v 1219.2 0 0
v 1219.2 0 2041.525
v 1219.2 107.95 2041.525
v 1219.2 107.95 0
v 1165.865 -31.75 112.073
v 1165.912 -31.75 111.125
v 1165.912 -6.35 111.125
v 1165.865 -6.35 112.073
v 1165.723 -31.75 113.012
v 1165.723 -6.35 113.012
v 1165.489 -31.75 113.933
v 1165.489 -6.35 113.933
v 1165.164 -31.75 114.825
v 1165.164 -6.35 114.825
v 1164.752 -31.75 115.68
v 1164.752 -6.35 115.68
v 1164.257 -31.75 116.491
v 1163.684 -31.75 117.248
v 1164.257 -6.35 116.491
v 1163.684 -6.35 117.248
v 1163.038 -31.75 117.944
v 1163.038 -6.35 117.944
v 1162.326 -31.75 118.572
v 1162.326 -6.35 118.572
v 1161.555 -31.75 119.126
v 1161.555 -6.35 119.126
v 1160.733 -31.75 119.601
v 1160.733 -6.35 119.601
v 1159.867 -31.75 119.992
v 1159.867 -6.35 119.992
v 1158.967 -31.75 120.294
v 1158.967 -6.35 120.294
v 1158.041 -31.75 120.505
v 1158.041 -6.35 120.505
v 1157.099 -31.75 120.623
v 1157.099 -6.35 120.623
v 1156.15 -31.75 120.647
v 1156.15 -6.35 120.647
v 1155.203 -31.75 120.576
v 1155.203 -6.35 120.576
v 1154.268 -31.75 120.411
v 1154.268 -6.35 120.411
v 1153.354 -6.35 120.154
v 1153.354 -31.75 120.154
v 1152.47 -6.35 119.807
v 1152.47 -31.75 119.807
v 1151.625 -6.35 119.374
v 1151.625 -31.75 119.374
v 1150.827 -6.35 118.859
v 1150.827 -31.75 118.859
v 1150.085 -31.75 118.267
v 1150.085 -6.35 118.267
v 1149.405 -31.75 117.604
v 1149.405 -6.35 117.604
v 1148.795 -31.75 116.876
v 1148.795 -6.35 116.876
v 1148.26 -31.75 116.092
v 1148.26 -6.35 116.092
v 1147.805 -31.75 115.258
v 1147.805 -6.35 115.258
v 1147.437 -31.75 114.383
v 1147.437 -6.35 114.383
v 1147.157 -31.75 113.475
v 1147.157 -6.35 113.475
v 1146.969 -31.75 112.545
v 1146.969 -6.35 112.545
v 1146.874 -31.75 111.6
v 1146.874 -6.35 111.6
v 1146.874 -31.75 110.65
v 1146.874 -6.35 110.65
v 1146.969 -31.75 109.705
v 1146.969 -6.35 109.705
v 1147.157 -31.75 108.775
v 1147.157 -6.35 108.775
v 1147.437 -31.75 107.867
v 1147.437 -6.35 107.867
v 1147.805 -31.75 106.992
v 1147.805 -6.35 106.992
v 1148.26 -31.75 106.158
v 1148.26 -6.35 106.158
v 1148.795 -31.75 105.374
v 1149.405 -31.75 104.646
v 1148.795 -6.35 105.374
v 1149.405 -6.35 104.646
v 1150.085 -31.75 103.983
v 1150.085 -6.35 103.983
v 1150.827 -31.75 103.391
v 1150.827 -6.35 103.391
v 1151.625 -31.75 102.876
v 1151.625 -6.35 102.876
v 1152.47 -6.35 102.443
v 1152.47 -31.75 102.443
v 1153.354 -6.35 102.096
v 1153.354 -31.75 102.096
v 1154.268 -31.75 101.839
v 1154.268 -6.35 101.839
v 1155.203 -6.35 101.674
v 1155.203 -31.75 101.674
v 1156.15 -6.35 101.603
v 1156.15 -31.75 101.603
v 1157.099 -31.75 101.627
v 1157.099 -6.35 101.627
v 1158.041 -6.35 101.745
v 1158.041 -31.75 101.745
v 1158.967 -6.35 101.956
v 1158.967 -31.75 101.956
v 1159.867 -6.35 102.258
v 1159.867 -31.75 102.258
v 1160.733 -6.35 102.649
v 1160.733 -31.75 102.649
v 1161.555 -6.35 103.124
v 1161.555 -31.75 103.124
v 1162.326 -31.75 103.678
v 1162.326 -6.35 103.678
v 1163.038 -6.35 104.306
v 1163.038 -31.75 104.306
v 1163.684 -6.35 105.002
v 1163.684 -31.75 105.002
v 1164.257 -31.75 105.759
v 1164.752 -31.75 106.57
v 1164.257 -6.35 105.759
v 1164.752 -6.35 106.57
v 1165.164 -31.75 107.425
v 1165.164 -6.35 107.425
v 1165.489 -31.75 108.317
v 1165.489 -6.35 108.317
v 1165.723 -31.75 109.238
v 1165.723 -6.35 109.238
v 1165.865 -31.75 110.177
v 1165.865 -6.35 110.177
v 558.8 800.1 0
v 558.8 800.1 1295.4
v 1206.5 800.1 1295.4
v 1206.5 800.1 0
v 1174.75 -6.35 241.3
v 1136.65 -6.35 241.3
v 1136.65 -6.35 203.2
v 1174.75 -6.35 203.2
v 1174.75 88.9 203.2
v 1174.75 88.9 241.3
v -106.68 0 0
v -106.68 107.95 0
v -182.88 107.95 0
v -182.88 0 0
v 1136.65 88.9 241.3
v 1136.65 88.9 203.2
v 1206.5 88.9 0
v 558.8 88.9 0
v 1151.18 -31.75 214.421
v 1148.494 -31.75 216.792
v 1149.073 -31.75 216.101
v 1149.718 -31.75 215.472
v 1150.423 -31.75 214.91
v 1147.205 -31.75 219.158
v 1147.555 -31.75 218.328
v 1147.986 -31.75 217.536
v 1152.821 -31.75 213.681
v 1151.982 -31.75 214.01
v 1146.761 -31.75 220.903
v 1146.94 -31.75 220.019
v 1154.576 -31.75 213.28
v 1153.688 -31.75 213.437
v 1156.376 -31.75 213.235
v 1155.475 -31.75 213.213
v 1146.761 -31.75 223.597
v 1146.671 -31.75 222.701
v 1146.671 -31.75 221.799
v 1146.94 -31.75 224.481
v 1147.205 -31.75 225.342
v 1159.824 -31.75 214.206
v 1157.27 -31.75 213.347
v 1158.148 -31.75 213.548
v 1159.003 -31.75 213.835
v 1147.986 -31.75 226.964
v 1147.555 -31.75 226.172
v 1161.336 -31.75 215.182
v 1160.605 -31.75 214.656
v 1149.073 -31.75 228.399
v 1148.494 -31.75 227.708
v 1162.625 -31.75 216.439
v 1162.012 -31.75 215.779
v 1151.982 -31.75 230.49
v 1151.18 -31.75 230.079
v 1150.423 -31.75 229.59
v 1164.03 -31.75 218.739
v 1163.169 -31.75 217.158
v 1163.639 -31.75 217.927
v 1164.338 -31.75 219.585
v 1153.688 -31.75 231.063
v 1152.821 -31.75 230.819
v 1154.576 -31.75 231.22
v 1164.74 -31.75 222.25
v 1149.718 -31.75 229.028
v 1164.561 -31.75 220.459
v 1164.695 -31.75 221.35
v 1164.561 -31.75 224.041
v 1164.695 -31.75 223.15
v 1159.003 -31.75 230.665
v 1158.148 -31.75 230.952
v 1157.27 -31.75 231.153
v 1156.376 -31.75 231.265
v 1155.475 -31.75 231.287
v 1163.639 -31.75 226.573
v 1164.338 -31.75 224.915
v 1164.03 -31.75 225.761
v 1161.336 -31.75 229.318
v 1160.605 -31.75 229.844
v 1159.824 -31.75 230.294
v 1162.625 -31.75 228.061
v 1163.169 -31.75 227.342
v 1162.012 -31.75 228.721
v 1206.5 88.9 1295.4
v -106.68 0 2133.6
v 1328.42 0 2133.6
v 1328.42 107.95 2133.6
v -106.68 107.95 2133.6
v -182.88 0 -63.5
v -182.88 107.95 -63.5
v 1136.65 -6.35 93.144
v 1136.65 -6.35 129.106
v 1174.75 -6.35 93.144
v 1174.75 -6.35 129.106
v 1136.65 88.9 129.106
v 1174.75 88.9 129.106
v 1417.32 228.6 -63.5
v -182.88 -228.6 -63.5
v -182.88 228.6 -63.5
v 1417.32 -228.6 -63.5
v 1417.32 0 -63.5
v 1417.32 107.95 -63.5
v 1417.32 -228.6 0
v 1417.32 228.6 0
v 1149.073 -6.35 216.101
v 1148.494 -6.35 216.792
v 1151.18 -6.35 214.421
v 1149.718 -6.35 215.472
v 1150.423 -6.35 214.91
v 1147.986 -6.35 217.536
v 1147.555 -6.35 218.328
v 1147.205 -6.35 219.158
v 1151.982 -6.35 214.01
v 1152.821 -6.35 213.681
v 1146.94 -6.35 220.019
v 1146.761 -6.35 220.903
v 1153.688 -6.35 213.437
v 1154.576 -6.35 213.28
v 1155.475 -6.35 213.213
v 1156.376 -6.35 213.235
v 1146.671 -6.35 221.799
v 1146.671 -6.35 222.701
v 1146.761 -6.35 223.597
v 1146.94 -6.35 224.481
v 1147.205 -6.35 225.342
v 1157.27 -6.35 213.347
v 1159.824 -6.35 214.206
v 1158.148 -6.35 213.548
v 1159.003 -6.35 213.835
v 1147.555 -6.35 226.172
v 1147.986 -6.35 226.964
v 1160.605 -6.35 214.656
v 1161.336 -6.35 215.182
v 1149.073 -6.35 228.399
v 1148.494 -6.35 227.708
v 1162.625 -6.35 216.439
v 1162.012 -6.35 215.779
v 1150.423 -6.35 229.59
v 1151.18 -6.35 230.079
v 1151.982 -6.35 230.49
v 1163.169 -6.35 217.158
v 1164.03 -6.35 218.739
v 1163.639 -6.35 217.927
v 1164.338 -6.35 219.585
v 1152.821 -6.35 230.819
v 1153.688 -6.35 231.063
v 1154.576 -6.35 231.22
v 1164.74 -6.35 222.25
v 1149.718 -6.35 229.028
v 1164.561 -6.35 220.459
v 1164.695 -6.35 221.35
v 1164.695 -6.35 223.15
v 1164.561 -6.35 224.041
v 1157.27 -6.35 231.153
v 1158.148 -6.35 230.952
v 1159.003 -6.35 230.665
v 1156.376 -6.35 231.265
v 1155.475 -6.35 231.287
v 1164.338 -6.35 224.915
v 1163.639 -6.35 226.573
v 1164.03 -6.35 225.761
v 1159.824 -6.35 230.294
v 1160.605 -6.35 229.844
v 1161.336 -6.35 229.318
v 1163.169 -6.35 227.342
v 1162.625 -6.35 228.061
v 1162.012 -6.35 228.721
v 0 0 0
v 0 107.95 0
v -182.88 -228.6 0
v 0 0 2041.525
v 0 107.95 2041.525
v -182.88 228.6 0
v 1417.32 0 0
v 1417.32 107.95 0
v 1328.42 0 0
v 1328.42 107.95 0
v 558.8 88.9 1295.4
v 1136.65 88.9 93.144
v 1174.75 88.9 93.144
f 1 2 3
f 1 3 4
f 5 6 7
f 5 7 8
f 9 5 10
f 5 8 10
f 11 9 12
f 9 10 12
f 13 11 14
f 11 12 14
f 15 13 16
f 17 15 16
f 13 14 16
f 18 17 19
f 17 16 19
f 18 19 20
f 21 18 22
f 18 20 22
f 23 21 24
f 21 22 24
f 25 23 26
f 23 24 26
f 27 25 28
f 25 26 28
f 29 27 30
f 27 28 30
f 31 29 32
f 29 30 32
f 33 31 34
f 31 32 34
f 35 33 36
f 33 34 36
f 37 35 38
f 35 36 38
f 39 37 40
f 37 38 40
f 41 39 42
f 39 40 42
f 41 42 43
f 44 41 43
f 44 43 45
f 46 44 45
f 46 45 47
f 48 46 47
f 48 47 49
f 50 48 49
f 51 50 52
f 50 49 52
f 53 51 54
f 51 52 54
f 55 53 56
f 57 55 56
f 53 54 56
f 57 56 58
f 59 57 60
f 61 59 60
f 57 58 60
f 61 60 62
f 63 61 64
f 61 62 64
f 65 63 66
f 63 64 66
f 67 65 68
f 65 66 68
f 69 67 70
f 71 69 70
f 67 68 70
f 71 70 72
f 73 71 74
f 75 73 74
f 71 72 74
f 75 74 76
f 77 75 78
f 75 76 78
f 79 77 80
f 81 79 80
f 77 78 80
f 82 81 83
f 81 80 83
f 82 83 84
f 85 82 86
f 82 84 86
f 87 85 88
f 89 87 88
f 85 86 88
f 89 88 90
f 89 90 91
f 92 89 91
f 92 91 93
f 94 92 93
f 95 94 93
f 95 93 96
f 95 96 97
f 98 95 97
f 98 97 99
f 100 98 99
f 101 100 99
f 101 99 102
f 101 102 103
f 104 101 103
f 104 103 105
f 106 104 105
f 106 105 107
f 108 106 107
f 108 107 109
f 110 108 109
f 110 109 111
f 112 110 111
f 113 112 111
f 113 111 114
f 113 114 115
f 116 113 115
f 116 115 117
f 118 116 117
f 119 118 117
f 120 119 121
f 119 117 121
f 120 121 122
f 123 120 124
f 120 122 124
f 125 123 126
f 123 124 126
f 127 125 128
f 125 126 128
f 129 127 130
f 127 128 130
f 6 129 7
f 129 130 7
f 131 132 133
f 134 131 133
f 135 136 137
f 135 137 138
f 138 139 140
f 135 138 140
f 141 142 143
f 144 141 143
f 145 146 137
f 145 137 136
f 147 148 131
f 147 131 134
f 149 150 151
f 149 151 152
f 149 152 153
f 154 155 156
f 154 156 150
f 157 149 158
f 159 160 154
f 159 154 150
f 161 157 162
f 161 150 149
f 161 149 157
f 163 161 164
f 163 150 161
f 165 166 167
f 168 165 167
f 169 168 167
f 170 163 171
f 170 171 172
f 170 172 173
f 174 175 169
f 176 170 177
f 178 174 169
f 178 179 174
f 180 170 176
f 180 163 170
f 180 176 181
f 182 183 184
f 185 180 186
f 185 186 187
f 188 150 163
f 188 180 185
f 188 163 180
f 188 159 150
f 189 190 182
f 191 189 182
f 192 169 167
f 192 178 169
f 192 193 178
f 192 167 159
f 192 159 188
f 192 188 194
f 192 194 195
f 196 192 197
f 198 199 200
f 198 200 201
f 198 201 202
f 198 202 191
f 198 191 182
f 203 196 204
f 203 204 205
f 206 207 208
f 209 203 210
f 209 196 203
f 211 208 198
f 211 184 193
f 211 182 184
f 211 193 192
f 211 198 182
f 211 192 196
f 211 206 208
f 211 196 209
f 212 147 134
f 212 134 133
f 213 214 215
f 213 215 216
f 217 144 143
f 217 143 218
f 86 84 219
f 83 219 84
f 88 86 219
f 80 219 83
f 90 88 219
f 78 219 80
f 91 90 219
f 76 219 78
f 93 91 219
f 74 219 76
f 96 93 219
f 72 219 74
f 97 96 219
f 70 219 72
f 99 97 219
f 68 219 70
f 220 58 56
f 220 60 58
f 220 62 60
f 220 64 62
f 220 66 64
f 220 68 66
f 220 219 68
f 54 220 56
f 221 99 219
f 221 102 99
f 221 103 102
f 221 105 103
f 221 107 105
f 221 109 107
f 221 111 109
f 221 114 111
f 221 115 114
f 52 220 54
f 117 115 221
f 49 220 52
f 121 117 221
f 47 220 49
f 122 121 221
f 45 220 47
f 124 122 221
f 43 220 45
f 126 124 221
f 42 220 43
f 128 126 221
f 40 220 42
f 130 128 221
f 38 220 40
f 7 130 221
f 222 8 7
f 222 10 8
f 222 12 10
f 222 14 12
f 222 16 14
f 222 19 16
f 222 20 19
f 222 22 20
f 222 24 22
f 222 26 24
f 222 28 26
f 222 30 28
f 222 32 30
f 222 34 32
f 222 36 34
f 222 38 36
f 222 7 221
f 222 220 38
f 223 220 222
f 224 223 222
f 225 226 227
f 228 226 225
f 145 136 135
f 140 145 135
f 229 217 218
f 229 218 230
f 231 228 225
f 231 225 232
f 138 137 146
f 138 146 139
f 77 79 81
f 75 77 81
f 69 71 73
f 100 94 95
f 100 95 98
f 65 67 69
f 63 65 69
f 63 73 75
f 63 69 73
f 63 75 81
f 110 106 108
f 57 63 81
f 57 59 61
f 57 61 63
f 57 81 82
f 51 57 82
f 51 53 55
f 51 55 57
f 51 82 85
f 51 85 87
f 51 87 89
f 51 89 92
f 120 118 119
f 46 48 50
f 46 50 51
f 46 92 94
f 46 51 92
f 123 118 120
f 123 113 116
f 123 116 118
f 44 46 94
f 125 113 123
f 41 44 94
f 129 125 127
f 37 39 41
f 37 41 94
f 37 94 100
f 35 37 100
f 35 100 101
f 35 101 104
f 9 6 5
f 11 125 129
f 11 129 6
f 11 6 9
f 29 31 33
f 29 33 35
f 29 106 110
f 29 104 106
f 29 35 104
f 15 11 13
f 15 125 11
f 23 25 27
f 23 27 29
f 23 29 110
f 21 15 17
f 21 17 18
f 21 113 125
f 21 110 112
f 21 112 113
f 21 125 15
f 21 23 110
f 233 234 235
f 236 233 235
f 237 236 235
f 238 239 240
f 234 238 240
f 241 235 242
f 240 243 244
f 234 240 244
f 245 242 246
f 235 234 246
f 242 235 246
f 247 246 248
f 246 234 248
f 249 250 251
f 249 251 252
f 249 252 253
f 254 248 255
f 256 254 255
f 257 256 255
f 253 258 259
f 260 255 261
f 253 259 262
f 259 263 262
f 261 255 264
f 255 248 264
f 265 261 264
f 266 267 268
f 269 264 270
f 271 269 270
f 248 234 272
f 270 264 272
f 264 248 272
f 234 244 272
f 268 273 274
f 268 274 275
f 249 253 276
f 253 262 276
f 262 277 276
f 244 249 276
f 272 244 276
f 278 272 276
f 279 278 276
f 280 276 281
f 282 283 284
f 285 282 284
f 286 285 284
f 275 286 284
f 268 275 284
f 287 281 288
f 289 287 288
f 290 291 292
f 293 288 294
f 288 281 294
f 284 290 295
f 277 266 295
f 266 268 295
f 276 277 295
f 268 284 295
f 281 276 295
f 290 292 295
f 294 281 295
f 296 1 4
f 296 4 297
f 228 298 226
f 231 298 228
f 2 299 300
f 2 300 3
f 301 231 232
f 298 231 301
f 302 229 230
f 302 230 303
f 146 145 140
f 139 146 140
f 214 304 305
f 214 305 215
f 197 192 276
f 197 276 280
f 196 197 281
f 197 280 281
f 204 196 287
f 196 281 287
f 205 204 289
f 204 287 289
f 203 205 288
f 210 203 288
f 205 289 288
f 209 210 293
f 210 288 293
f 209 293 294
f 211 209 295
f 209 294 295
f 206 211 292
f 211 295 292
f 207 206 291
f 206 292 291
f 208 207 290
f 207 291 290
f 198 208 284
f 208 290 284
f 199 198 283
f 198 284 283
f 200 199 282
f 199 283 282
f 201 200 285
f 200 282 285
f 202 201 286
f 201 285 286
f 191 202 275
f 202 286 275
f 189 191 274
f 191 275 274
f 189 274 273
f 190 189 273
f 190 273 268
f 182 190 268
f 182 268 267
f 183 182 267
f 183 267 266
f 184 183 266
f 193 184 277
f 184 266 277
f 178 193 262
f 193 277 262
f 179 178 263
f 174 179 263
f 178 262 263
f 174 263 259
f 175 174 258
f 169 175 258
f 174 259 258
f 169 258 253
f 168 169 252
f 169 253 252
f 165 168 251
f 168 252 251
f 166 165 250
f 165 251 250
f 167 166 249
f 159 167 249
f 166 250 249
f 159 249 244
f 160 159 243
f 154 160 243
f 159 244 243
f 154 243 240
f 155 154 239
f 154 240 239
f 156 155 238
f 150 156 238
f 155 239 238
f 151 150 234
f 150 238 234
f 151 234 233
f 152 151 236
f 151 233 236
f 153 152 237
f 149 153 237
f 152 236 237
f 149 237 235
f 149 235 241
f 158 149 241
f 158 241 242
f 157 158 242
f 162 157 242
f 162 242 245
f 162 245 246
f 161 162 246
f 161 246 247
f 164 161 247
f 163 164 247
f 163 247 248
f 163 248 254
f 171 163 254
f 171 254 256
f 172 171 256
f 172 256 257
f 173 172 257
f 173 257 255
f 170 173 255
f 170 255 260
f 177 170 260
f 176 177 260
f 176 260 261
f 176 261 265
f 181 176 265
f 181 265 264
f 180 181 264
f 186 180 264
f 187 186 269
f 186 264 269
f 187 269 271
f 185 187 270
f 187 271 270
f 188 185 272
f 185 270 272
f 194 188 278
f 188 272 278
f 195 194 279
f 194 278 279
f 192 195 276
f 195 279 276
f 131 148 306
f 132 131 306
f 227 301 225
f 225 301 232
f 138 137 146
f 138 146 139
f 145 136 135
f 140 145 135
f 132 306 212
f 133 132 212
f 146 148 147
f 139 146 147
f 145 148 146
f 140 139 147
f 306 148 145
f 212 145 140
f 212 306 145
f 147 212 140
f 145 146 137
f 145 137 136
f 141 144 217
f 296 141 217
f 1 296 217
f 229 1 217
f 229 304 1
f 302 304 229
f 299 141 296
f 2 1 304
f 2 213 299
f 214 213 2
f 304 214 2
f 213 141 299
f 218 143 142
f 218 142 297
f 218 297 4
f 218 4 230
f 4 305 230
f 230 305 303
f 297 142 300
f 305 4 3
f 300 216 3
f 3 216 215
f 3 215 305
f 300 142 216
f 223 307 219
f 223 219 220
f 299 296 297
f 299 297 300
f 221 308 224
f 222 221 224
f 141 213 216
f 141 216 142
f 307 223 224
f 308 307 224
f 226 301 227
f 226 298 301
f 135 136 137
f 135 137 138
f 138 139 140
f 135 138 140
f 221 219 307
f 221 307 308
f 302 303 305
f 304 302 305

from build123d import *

# Parameters (mm, degrees)
F1_DEPTH  = 228.6
F2_DEPTH  = 107.95
F4_W      = 647.7
F4_H      = 1295.4
F5_DEPTH  = 711.2
F6_W      = 38.1
F6_H      = 38.1
F7_DEPTH  = 95.25
F8_DEPTH  = 95.25
F6_H_2    = 35.9624922276
F9_R      = 9.525
F10_DEPTH = 25.4
F11_R     = 9.0398884045
F12_DEPTH = 25.4


with BuildPart() as f1:
    # F0 (on Front) → F1 (new body, symmetric)
    with BuildSketch(Plane.XZ):
        Polygon((558.8, 0), (0, 0), (-106.68, 0), (-182.88, 0), (-182.88, -63.5), (1417.32, -63.5), (1417.32, 0), (1328.42, 0), (1219.2, 0), (1206.5, 0), align=None)
    extrude(amount=F1_DEPTH, both=True)


with BuildPart() as f2:
    # F0 (on Front) → F2 (new body)
    with BuildSketch(Plane.XZ):
        Polygon((-106.68, 0), (0, 0), (0, 2041.525), (1219.2, 2041.525), (1219.2, 0), (1328.42, 0), (1328.42, 2133.6), (-106.68, 2133.6), align=None)
        Polygon((558.8, 0), (0, 0), (-106.68, 0), (-182.88, 0), (-182.88, -63.5), (1417.32, -63.5), (1417.32, 0), (1328.42, 0), (1219.2, 0), (1206.5, 0), align=None)
    extrude(amount=-F2_DEPTH)


with BuildPart() as f5:
    # F4 (on offset) → F5 (new body)
    with BuildSketch(Plane.XZ.offset(-88.9)):
        with Locations((882.65, 647.7)):
            Rectangle(F4_W, F4_H)
    extrude(amount=-F5_DEPTH)

    # F6 (on face) → F7 (join)
    with BuildSketch(Plane.XZ.offset(-88.9)):
        with Locations((1155.7, 222.25)):
            Rectangle(F6_W, F6_H)
    extrude(amount=F7_DEPTH)


with BuildPart() as f8:
    # F6 (on face) → F8 (new body)
    with BuildSketch(Plane.XZ.offset(-88.9)):
        with Locations((1155.7, 222.25)):
            Rectangle(F6_W, F6_H)
    extrude(amount=F8_DEPTH)


with BuildPart() as f8b:
    # F6 (on face) → F8, piece 2 (new body)
    with BuildSketch(Plane.XZ.offset(-88.9)):
        with Locations((1155.7, 111.125)):
            Rectangle(F6_W, F6_H_2)
    extrude(amount=F8_DEPTH)

    # F9 (on face) → F10 (join)
    with BuildSketch(Plane.XZ.offset(6.35)):
        with Locations((1156.3872098923, 111.125)):
            Circle(F9_R)
    extrude(amount=F10_DEPTH)


with BuildPart() as f12:
    # F11 (on face) → F12 (new body)
    with BuildSketch(Plane.XZ.offset(6.35)):
        with Locations((1155.699968338, 222.25)):
            Circle(F11_R)
    extrude(amount=F12_DEPTH)


solid = Compound([f1.part, f2.part, f5.part, f8.part, f8b.part, f12.part])
